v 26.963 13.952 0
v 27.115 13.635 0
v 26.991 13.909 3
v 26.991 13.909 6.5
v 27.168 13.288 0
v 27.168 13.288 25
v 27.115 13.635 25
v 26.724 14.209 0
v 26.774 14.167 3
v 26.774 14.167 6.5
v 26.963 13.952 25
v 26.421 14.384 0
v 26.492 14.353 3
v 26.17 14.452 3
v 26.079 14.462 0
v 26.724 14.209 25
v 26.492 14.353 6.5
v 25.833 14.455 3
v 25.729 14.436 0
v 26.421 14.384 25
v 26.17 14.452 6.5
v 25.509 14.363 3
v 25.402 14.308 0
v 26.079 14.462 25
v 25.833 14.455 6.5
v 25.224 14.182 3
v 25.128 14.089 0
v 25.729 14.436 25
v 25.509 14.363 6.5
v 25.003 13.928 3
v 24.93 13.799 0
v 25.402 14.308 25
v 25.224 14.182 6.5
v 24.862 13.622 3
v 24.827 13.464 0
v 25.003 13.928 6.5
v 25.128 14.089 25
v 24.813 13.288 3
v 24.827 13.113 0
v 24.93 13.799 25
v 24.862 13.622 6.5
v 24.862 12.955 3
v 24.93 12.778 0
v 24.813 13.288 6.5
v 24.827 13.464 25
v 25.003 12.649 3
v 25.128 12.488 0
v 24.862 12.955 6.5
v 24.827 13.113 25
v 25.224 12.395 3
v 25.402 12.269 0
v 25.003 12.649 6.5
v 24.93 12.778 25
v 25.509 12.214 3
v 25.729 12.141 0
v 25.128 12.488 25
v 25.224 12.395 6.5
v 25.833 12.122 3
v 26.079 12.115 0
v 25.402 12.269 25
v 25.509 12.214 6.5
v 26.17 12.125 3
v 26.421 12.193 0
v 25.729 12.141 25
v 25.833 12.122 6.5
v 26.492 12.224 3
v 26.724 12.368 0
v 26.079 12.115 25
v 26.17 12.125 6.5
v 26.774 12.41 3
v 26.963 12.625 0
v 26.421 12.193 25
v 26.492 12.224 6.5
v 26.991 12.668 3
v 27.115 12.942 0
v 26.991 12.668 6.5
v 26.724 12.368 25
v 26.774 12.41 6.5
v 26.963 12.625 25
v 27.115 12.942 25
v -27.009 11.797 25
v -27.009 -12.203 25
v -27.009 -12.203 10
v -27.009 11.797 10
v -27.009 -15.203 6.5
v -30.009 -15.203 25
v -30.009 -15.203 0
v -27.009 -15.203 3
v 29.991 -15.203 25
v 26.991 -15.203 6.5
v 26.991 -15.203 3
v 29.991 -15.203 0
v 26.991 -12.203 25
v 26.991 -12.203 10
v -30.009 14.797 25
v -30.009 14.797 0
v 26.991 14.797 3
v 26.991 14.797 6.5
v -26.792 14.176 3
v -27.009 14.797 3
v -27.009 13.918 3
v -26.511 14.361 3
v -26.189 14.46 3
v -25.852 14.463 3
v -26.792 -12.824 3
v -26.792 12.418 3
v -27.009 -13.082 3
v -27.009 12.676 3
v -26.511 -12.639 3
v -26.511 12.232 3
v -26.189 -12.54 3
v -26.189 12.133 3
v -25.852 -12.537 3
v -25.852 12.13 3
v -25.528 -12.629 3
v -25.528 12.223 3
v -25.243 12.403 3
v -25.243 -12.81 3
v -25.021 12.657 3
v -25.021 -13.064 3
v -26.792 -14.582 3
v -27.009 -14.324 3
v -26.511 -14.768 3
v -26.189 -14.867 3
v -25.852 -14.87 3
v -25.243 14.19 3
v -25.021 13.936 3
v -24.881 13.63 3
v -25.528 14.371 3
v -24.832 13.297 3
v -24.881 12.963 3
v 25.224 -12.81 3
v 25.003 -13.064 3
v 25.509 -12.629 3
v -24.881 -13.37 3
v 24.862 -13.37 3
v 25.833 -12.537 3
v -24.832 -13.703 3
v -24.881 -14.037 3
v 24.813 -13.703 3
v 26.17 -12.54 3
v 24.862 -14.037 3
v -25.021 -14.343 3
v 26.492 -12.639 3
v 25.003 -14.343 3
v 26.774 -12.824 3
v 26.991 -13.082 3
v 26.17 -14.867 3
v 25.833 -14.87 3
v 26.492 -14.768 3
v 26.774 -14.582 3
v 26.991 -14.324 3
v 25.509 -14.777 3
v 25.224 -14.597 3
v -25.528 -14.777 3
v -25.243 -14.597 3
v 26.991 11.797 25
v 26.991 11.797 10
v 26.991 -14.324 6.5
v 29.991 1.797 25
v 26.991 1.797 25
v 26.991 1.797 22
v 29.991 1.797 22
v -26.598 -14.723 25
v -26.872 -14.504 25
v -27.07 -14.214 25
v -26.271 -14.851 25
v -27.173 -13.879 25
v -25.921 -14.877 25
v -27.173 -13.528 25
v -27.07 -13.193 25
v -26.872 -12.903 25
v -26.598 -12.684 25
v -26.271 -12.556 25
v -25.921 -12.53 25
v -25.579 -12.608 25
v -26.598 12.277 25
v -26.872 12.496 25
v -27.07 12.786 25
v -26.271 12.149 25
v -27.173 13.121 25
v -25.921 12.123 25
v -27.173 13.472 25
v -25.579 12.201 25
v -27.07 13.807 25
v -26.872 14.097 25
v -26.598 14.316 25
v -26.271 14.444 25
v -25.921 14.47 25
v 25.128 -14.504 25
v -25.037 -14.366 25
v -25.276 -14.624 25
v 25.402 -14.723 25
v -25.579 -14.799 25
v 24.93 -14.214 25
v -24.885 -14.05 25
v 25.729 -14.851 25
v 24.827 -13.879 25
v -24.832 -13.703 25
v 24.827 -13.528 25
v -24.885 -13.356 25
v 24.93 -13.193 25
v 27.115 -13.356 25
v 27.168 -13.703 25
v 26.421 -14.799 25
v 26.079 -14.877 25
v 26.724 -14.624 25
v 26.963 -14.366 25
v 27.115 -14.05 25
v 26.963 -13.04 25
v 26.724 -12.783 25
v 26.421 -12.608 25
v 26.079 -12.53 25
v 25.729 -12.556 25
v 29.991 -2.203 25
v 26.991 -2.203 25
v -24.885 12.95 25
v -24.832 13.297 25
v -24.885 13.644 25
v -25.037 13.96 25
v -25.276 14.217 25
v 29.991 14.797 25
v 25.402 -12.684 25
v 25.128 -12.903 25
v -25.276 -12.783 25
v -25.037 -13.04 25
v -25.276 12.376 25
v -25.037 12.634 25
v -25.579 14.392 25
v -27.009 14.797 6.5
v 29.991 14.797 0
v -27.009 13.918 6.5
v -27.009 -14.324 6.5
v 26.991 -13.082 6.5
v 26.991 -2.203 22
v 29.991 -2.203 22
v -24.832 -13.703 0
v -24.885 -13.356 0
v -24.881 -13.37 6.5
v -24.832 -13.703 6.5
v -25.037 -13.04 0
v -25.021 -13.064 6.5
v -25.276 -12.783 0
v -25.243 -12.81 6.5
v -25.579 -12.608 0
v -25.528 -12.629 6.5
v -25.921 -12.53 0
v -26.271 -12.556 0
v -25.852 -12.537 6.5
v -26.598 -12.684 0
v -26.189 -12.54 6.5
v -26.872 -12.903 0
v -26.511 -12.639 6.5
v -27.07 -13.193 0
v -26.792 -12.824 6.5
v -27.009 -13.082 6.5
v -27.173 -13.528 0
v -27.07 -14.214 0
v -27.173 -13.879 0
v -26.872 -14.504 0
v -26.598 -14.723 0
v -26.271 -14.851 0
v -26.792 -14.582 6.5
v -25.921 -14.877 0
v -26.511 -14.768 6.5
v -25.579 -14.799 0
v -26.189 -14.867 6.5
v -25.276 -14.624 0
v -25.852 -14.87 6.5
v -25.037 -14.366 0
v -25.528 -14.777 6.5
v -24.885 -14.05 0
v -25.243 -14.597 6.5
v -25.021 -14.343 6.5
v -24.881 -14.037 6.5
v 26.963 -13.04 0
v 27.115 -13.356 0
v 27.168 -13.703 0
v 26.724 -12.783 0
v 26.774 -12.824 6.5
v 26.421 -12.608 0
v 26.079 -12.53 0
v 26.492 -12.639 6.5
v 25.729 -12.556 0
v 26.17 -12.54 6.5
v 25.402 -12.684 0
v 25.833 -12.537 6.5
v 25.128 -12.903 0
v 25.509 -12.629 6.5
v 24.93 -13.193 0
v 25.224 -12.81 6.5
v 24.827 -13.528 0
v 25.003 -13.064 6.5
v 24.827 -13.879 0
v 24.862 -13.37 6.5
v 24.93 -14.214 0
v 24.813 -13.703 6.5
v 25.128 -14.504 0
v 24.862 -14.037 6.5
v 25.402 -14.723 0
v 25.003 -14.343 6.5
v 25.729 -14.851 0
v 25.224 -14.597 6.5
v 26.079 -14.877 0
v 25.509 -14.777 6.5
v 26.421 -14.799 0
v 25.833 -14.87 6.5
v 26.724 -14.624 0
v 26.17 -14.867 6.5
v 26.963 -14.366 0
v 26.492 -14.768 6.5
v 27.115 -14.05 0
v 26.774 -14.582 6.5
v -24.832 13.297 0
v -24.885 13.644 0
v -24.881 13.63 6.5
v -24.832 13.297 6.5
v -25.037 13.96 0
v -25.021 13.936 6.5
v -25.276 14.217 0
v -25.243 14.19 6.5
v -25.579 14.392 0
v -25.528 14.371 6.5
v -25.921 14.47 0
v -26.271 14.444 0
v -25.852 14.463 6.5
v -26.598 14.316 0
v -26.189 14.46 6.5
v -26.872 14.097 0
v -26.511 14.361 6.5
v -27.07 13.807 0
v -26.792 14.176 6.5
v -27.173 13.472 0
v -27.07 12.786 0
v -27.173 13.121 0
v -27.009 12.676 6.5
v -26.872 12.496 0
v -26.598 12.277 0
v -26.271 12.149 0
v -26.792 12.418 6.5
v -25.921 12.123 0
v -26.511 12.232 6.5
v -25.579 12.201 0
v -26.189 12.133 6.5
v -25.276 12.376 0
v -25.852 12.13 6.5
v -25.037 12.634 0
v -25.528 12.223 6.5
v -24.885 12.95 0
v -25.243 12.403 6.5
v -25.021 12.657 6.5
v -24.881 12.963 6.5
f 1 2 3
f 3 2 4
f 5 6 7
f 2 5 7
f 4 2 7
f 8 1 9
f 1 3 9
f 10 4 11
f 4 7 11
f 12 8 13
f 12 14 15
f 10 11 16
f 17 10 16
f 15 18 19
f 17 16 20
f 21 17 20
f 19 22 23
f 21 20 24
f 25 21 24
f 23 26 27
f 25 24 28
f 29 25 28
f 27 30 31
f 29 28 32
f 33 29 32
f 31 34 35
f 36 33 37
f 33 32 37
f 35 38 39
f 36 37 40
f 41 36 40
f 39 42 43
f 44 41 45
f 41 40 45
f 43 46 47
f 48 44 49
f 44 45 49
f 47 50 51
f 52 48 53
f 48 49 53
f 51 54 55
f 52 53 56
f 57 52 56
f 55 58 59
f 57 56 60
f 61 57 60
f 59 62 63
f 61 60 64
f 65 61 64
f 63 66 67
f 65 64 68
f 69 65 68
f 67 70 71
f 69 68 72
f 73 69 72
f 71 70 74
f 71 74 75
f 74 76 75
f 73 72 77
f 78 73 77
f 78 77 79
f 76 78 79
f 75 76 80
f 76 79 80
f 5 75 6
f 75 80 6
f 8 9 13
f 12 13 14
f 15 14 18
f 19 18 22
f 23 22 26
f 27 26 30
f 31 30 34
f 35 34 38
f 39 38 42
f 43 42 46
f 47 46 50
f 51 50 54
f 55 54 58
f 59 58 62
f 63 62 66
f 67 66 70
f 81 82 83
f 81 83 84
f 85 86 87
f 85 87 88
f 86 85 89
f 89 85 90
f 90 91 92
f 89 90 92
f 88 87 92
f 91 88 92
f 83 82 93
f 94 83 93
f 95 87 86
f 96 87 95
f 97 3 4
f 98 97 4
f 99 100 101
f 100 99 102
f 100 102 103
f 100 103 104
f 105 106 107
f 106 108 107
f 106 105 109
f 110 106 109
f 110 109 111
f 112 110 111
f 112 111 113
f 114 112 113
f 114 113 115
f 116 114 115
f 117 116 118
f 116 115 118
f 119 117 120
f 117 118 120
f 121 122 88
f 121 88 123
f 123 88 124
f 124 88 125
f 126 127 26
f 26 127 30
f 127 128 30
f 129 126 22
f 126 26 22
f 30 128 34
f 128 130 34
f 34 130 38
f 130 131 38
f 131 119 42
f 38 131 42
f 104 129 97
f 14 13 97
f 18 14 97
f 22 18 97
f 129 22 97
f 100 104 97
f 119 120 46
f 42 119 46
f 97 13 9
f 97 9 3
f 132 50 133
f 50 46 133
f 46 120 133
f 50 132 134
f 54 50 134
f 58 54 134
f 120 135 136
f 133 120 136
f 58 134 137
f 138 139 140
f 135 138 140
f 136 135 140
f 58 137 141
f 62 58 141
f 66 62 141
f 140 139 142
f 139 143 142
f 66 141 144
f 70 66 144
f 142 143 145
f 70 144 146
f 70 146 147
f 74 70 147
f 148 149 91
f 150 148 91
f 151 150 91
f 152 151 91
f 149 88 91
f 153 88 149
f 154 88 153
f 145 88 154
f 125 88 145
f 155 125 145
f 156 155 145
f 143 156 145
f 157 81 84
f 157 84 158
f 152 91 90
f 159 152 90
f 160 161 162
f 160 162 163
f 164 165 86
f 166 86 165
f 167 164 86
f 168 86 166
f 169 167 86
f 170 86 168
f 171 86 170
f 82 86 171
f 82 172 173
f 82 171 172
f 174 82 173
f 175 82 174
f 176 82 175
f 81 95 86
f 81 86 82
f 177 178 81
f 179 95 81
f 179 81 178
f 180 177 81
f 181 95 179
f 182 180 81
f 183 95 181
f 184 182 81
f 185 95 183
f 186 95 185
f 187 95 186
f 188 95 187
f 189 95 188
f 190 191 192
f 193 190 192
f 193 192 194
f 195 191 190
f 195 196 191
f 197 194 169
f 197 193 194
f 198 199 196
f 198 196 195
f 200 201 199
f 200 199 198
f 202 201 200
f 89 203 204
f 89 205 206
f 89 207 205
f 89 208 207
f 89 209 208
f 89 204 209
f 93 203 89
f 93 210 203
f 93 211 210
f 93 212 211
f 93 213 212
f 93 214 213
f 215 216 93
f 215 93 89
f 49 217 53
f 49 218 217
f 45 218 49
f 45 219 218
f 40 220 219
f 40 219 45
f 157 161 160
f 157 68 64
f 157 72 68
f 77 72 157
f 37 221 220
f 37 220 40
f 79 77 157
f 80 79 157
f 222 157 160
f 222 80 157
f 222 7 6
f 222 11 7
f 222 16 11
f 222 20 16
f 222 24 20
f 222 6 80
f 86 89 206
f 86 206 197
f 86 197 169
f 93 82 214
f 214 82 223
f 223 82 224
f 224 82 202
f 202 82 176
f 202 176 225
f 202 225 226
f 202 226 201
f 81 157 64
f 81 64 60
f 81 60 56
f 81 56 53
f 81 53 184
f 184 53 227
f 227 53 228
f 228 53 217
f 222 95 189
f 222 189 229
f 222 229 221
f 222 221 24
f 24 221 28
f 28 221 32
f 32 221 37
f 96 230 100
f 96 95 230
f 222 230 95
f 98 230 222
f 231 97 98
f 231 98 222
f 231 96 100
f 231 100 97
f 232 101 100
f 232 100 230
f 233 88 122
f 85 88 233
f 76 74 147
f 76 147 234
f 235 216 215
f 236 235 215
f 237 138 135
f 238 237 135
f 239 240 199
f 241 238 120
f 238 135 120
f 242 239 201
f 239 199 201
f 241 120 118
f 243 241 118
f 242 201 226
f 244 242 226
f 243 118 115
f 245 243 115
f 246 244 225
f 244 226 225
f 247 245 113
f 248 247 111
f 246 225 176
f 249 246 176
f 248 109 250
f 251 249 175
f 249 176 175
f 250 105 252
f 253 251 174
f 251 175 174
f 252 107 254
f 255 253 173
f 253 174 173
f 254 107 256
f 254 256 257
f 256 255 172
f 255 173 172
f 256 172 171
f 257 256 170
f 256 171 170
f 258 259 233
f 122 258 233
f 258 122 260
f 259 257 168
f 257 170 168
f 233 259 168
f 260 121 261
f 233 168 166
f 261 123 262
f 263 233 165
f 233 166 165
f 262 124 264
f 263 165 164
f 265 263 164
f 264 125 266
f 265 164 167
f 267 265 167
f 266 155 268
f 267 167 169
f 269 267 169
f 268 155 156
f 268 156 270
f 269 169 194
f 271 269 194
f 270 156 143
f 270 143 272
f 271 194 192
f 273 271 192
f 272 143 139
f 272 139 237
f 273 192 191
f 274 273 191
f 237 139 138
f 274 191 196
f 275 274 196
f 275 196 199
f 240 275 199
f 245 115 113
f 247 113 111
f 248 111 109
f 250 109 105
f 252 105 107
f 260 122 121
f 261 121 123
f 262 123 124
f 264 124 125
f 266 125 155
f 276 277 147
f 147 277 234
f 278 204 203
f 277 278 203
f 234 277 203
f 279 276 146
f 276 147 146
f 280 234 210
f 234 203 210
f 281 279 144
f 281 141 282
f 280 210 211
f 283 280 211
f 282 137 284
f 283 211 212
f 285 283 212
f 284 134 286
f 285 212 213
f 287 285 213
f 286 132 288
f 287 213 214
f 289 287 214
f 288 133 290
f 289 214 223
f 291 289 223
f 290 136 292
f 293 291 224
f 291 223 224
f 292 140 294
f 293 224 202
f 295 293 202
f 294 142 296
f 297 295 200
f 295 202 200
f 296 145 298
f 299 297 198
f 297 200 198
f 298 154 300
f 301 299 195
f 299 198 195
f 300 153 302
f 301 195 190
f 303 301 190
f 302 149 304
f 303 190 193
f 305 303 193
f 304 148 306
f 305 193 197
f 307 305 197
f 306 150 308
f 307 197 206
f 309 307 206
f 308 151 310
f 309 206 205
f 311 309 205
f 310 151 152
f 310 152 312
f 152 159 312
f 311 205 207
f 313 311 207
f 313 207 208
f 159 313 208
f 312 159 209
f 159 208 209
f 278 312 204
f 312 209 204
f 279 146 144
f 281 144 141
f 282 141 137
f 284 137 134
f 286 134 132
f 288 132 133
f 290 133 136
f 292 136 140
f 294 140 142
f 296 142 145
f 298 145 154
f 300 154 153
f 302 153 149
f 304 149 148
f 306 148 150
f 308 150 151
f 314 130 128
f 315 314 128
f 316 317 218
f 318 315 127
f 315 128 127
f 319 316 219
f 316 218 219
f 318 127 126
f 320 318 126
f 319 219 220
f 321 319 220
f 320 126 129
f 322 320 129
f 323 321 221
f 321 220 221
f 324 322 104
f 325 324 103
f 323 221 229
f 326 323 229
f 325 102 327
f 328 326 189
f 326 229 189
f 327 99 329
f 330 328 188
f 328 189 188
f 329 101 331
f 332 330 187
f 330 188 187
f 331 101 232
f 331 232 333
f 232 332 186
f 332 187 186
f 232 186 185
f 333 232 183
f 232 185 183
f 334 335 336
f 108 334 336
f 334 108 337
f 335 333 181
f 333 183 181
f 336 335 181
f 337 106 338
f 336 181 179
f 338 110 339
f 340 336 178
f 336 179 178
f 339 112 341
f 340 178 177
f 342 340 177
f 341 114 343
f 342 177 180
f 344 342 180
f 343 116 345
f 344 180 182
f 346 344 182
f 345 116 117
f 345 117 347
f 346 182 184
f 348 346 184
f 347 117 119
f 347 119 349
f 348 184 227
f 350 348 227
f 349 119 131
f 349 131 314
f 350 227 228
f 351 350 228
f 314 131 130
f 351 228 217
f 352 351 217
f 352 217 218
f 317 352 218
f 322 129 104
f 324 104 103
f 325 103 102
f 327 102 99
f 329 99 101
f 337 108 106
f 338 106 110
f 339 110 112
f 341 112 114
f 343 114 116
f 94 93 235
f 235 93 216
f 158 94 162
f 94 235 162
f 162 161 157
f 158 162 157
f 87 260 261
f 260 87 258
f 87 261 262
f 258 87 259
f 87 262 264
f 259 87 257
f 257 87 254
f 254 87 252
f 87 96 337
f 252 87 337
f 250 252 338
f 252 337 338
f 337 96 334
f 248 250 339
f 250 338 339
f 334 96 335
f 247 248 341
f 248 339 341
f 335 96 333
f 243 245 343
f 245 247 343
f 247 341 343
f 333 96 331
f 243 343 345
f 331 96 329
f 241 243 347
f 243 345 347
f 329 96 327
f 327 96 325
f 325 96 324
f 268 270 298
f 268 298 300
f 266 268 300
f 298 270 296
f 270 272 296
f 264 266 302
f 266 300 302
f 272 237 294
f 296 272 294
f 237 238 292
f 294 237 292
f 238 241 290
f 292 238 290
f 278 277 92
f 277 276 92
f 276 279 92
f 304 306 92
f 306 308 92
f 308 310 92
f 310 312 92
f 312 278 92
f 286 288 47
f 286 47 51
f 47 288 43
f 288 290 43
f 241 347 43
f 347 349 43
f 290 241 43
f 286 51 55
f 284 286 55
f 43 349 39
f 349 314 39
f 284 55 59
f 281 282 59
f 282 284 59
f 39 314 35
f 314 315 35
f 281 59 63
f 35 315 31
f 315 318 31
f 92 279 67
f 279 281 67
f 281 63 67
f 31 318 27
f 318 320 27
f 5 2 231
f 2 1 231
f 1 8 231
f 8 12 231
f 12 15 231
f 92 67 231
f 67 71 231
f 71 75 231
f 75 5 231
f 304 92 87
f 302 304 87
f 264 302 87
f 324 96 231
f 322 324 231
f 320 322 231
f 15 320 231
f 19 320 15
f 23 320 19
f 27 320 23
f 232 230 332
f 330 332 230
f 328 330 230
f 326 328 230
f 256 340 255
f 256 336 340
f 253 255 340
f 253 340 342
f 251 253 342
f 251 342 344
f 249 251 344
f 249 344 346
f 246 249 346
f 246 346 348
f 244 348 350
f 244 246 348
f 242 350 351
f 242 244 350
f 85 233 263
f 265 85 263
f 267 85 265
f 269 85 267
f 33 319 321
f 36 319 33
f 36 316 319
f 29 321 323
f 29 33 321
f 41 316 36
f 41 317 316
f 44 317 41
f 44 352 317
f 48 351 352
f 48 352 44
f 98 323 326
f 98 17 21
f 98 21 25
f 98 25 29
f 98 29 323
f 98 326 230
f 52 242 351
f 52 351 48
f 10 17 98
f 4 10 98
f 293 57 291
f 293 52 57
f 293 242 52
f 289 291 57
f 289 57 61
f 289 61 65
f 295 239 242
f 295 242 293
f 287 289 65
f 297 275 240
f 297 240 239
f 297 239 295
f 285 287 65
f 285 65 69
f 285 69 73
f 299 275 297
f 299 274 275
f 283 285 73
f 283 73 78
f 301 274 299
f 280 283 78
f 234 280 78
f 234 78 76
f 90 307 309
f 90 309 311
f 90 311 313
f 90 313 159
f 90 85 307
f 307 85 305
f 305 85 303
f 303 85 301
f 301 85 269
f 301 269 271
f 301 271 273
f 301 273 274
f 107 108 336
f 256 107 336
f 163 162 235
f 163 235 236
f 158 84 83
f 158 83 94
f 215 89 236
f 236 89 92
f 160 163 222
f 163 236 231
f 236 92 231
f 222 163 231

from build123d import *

# Parameters (mm, degrees)
F0_W     = 60
F0_H     = 30
F1_DEPTH = 25
F2_W     = 54
F2_H     = 3.5
F3_DEPTH = 30.001
F4_W     = 54
F4_H     = 24
F5_DEPTH = 15
F6_W     = 3
F6_H     = 4
F7_DEPTH = 3
F8_R     = 1.177089
F9_DEPTH = 25.001


with BuildPart() as f1:
    # F0 (on Top) → F1 (new body)
    with BuildSketch(Plane.XY):
        with Locations((-0.009455, -0.203341)):
            Rectangle(F0_W, F0_H)
    extrude(amount=F1_DEPTH)

    # F2 (on face) → F3 (cut, through all)
    with BuildSketch(Plane.XZ.offset(15.203341)):
        with Locations((-0.009455, 4.75)):
            Rectangle(F2_W, F2_H)
    extrude(amount=-F3_DEPTH, mode=Mode.SUBTRACT)

    # F4 (on face) → F5 (cut)
    with BuildSketch(Plane.XY.offset(25)):
        with Locations((-0.009455, -0.203341)):
            Rectangle(F4_W, F4_H)
    extrude(amount=-F5_DEPTH, mode=Mode.SUBTRACT)

    # F6 (on face) → F7 (cut)
    with BuildSketch(Plane.XY.offset(25)):
        with Locations((28.490545, -0.203341)):
            Rectangle(F6_W, F6_H)
    extrude(amount=-F7_DEPTH, mode=Mode.SUBTRACT)

    # F8 (on face) → F9 (cut, through all)
    with BuildSketch(Plane.XY.offset(25)):
        with Locations((25.990545, 13.288478)):
            Circle(F8_R)
        with Locations((-26.009455, 13.296659)):
            Circle(F8_R)
        with Locations((-26.009455, -13.703341)):
            Circle(F8_R)
        with Locations((25.990545, -13.703341)):
            Circle(F8_R)
    extrude(amount=-F9_DEPTH, mode=Mode.SUBTRACT)


solid = f1.part
